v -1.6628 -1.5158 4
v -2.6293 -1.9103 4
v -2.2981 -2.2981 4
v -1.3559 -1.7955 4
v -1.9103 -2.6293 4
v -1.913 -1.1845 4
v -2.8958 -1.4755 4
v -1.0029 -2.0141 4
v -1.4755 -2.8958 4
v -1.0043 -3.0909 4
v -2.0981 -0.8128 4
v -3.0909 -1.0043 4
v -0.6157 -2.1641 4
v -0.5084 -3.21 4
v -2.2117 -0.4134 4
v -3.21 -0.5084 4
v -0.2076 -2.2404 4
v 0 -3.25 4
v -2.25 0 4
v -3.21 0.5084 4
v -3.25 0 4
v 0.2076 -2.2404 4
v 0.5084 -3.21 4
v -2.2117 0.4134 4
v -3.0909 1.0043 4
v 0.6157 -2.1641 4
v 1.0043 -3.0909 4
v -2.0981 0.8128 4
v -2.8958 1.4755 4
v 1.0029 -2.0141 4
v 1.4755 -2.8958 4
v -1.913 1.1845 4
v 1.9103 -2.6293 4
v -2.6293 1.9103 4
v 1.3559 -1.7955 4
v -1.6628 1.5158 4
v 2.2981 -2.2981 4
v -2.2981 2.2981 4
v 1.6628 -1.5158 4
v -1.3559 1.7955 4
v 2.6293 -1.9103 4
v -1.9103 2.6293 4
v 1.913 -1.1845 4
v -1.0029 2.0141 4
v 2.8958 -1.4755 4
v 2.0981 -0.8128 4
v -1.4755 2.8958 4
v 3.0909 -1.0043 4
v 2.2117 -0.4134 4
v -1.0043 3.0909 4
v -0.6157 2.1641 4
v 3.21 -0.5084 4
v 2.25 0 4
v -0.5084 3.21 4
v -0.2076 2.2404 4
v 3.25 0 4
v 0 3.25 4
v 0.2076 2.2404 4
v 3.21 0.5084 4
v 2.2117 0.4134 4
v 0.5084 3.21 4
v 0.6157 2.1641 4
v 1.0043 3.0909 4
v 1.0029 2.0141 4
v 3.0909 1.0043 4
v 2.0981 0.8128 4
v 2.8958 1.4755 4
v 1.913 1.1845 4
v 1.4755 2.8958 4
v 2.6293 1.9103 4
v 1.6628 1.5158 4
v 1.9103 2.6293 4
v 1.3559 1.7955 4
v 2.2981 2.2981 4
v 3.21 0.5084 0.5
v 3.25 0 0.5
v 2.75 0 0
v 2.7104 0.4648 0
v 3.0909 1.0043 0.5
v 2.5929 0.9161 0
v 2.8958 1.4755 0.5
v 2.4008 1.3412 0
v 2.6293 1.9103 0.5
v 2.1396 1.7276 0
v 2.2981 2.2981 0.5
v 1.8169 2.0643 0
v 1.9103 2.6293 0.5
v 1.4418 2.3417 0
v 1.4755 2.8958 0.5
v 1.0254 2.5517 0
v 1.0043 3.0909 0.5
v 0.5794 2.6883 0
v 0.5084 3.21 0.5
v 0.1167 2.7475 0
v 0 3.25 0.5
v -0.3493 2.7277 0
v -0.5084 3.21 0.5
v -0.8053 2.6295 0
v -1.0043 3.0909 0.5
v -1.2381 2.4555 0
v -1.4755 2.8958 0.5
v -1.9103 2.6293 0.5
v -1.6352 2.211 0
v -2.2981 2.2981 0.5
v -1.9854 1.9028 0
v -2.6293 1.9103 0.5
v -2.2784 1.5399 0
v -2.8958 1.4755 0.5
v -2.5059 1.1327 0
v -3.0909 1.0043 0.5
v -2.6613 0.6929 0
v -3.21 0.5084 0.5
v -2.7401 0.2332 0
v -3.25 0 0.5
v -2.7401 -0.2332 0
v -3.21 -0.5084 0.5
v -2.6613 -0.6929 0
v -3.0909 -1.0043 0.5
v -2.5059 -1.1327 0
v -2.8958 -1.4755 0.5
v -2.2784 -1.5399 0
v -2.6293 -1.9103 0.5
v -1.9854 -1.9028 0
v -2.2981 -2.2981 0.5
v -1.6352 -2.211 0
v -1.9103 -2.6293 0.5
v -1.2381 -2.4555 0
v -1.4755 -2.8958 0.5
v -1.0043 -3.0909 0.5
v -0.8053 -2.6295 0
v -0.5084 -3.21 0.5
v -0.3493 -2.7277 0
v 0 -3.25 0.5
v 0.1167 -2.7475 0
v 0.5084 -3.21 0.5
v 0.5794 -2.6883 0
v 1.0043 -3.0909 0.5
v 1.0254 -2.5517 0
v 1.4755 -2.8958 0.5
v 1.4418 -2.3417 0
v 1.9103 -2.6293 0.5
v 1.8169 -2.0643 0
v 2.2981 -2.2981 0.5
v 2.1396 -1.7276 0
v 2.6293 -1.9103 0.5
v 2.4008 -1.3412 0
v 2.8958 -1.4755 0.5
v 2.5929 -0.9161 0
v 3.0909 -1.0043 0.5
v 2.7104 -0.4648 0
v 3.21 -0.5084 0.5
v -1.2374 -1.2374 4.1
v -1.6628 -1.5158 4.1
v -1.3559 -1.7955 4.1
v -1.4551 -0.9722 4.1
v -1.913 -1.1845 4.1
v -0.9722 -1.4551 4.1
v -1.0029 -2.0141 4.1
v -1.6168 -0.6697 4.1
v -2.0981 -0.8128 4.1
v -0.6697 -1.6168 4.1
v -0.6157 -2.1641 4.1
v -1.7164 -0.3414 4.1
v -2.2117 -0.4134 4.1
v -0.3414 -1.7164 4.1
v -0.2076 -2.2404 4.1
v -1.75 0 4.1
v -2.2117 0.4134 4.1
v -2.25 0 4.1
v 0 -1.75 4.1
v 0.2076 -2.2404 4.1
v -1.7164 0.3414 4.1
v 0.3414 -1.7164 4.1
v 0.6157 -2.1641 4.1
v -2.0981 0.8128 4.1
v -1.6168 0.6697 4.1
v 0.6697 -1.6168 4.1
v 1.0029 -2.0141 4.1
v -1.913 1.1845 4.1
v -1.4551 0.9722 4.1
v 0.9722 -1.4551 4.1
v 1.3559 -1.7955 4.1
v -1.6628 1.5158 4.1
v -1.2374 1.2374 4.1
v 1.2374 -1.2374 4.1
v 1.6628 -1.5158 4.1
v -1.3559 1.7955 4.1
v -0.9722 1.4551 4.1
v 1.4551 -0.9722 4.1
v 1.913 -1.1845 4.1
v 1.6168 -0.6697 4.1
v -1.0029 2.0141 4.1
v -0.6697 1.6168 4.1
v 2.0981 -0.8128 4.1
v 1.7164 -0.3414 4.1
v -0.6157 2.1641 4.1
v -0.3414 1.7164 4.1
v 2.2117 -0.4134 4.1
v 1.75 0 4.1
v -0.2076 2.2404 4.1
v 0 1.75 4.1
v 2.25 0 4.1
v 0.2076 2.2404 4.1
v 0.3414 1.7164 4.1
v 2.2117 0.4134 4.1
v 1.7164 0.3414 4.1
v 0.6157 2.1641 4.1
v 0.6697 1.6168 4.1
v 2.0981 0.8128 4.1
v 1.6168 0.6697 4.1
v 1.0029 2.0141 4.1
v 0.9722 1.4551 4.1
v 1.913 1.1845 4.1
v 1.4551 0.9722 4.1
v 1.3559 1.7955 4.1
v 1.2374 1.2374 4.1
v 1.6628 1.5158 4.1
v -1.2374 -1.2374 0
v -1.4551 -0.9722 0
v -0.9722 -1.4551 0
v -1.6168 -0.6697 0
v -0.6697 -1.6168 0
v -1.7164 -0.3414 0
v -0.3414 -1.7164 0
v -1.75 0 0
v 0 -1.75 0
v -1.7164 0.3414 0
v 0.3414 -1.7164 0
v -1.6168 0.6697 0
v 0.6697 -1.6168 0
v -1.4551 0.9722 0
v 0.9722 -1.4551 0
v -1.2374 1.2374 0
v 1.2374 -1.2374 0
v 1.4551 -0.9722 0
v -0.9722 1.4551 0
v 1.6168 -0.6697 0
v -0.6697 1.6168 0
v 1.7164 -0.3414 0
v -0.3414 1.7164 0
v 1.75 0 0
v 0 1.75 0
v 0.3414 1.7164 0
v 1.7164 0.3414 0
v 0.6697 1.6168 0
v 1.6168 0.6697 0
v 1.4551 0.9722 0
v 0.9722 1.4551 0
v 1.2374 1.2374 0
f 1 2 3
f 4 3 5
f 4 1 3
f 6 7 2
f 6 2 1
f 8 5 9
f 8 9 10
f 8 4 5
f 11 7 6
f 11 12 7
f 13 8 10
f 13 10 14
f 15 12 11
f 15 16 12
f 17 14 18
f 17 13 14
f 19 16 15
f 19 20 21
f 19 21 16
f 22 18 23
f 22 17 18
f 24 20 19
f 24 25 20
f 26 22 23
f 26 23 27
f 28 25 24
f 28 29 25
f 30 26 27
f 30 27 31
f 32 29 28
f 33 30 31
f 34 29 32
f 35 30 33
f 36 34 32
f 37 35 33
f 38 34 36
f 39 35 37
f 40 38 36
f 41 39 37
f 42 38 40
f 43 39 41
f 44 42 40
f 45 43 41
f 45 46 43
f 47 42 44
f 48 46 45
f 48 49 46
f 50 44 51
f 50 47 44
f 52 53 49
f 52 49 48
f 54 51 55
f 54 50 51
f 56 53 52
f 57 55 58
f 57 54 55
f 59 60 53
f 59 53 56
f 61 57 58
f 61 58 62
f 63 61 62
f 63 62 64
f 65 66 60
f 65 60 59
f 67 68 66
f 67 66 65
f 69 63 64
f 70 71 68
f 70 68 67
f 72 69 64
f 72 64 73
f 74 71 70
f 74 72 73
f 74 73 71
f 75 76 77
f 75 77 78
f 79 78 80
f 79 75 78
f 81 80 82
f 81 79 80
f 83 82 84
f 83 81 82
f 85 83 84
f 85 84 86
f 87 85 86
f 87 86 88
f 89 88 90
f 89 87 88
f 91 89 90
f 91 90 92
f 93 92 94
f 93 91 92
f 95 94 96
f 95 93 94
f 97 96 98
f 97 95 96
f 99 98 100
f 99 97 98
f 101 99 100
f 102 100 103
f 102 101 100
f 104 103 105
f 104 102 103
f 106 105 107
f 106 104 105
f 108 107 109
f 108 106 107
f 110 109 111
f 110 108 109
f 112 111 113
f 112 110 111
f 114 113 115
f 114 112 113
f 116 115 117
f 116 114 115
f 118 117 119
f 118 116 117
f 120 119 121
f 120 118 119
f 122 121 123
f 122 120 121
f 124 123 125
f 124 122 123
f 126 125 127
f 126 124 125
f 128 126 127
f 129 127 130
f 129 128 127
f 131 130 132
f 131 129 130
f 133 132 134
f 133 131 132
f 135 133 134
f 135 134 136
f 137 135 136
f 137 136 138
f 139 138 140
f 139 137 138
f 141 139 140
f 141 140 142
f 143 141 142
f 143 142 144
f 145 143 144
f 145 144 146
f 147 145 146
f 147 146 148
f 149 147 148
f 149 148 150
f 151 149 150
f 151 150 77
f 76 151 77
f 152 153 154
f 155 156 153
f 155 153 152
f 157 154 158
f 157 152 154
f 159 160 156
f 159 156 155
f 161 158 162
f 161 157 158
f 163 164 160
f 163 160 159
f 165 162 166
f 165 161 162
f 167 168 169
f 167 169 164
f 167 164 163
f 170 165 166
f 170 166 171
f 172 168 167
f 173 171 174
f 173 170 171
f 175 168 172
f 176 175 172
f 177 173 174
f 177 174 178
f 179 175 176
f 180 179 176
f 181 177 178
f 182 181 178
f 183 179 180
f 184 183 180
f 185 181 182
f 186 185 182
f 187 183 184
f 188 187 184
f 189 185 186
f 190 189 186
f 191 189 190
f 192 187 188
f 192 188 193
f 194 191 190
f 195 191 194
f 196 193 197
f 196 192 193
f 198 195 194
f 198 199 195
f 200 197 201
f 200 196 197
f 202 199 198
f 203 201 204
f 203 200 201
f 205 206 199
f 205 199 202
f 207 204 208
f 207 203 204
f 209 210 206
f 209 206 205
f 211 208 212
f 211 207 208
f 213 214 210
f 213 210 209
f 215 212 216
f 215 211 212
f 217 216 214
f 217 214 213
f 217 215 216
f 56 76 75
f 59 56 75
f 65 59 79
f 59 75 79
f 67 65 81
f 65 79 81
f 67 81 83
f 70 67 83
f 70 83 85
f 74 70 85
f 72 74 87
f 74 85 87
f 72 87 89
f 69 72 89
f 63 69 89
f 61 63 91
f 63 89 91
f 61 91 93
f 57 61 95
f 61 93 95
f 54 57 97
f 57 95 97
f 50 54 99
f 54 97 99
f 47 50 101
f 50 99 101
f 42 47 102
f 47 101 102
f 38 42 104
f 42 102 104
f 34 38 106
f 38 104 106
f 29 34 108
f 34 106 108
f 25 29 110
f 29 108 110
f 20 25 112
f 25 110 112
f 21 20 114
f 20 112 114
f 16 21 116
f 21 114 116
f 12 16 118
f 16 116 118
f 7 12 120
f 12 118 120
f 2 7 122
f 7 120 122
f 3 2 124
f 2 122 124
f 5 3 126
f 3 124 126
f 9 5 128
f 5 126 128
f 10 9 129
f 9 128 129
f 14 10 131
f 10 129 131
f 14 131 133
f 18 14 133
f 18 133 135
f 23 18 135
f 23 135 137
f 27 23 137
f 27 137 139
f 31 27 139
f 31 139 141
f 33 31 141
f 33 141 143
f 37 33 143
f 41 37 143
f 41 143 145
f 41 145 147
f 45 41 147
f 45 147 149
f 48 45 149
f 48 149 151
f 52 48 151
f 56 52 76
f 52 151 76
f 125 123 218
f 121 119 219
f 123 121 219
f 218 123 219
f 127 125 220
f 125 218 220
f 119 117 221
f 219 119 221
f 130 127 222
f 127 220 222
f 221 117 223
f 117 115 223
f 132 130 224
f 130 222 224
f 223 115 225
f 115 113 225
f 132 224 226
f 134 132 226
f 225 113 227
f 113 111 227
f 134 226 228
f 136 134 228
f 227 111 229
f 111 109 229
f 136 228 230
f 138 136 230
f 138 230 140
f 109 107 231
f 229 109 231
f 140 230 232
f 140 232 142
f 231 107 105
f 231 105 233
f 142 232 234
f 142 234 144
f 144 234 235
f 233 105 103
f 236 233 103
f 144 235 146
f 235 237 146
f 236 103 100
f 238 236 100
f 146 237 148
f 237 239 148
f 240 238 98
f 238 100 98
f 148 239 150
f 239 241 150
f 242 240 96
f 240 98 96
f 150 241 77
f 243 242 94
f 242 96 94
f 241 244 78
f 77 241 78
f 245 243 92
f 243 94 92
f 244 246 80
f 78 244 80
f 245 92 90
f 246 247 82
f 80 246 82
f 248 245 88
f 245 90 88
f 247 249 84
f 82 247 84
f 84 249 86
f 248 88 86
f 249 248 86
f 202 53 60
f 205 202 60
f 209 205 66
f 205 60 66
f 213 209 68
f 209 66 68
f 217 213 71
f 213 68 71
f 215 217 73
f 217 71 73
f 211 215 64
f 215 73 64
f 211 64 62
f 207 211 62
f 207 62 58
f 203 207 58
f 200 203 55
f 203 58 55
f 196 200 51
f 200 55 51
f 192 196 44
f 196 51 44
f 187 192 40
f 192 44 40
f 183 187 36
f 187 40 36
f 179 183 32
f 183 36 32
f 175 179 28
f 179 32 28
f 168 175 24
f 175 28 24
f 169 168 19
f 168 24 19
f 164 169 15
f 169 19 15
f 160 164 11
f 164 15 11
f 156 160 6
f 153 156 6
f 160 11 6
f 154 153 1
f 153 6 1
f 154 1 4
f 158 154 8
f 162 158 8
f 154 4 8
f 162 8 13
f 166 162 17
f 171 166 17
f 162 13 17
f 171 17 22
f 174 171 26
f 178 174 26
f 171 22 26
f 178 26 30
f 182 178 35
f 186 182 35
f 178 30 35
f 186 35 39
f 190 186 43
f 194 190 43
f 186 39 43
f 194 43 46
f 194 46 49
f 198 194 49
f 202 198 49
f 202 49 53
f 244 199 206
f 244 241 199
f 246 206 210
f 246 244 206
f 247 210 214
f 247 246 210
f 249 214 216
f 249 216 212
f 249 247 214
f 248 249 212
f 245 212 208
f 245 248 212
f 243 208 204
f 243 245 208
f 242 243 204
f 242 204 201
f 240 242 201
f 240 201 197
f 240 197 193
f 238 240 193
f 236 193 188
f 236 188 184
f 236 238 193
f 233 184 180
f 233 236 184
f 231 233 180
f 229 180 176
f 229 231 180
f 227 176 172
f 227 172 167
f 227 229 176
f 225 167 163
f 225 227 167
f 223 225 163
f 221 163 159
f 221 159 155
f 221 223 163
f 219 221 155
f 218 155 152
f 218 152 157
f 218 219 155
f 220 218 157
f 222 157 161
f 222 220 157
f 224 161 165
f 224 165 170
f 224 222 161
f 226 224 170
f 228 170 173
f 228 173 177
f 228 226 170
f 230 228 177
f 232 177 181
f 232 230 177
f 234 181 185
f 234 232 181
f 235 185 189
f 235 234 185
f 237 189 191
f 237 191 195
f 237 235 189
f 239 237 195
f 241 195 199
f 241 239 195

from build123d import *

# Parameters (mm, degrees)
SKETCH1_R           = 3.25
SKETCH1_R_2         = 1.75
BOSS_EXTRUDE1_DEPTH = 4
SKETCH2_R           = 2.25
SKETCH2_R_2         = 1.75
BOSS_EXTRUDE2_DEPTH = 0.1
CHAMFER1_SIZE       = 0.5


with BuildPart() as part:
    # Sketch1 → Boss-Extrude1 (new body)
    with BuildSketch(Plane.XY):
        Circle(SKETCH1_R)
        Circle(SKETCH1_R_2, mode=Mode.SUBTRACT)
    extrude(amount=BOSS_EXTRUDE1_DEPTH)

    # Sketch2 → Boss-Extrude2 (add)
    with BuildSketch(Plane.XY.offset(4)):
        Circle(SKETCH2_R)
        Circle(SKETCH2_R_2, mode=Mode.SUBTRACT)
    extrude(amount=BOSS_EXTRUDE2_DEPTH)

    # Chamfer1
    chamfer1_edges = [part.edges().sort_by_distance(p)[0] for p in [
        (-3.25, 0, 0),
    ]]
    chamfer(chamfer1_edges, length=CHAMFER1_SIZE)


solid = part.part
